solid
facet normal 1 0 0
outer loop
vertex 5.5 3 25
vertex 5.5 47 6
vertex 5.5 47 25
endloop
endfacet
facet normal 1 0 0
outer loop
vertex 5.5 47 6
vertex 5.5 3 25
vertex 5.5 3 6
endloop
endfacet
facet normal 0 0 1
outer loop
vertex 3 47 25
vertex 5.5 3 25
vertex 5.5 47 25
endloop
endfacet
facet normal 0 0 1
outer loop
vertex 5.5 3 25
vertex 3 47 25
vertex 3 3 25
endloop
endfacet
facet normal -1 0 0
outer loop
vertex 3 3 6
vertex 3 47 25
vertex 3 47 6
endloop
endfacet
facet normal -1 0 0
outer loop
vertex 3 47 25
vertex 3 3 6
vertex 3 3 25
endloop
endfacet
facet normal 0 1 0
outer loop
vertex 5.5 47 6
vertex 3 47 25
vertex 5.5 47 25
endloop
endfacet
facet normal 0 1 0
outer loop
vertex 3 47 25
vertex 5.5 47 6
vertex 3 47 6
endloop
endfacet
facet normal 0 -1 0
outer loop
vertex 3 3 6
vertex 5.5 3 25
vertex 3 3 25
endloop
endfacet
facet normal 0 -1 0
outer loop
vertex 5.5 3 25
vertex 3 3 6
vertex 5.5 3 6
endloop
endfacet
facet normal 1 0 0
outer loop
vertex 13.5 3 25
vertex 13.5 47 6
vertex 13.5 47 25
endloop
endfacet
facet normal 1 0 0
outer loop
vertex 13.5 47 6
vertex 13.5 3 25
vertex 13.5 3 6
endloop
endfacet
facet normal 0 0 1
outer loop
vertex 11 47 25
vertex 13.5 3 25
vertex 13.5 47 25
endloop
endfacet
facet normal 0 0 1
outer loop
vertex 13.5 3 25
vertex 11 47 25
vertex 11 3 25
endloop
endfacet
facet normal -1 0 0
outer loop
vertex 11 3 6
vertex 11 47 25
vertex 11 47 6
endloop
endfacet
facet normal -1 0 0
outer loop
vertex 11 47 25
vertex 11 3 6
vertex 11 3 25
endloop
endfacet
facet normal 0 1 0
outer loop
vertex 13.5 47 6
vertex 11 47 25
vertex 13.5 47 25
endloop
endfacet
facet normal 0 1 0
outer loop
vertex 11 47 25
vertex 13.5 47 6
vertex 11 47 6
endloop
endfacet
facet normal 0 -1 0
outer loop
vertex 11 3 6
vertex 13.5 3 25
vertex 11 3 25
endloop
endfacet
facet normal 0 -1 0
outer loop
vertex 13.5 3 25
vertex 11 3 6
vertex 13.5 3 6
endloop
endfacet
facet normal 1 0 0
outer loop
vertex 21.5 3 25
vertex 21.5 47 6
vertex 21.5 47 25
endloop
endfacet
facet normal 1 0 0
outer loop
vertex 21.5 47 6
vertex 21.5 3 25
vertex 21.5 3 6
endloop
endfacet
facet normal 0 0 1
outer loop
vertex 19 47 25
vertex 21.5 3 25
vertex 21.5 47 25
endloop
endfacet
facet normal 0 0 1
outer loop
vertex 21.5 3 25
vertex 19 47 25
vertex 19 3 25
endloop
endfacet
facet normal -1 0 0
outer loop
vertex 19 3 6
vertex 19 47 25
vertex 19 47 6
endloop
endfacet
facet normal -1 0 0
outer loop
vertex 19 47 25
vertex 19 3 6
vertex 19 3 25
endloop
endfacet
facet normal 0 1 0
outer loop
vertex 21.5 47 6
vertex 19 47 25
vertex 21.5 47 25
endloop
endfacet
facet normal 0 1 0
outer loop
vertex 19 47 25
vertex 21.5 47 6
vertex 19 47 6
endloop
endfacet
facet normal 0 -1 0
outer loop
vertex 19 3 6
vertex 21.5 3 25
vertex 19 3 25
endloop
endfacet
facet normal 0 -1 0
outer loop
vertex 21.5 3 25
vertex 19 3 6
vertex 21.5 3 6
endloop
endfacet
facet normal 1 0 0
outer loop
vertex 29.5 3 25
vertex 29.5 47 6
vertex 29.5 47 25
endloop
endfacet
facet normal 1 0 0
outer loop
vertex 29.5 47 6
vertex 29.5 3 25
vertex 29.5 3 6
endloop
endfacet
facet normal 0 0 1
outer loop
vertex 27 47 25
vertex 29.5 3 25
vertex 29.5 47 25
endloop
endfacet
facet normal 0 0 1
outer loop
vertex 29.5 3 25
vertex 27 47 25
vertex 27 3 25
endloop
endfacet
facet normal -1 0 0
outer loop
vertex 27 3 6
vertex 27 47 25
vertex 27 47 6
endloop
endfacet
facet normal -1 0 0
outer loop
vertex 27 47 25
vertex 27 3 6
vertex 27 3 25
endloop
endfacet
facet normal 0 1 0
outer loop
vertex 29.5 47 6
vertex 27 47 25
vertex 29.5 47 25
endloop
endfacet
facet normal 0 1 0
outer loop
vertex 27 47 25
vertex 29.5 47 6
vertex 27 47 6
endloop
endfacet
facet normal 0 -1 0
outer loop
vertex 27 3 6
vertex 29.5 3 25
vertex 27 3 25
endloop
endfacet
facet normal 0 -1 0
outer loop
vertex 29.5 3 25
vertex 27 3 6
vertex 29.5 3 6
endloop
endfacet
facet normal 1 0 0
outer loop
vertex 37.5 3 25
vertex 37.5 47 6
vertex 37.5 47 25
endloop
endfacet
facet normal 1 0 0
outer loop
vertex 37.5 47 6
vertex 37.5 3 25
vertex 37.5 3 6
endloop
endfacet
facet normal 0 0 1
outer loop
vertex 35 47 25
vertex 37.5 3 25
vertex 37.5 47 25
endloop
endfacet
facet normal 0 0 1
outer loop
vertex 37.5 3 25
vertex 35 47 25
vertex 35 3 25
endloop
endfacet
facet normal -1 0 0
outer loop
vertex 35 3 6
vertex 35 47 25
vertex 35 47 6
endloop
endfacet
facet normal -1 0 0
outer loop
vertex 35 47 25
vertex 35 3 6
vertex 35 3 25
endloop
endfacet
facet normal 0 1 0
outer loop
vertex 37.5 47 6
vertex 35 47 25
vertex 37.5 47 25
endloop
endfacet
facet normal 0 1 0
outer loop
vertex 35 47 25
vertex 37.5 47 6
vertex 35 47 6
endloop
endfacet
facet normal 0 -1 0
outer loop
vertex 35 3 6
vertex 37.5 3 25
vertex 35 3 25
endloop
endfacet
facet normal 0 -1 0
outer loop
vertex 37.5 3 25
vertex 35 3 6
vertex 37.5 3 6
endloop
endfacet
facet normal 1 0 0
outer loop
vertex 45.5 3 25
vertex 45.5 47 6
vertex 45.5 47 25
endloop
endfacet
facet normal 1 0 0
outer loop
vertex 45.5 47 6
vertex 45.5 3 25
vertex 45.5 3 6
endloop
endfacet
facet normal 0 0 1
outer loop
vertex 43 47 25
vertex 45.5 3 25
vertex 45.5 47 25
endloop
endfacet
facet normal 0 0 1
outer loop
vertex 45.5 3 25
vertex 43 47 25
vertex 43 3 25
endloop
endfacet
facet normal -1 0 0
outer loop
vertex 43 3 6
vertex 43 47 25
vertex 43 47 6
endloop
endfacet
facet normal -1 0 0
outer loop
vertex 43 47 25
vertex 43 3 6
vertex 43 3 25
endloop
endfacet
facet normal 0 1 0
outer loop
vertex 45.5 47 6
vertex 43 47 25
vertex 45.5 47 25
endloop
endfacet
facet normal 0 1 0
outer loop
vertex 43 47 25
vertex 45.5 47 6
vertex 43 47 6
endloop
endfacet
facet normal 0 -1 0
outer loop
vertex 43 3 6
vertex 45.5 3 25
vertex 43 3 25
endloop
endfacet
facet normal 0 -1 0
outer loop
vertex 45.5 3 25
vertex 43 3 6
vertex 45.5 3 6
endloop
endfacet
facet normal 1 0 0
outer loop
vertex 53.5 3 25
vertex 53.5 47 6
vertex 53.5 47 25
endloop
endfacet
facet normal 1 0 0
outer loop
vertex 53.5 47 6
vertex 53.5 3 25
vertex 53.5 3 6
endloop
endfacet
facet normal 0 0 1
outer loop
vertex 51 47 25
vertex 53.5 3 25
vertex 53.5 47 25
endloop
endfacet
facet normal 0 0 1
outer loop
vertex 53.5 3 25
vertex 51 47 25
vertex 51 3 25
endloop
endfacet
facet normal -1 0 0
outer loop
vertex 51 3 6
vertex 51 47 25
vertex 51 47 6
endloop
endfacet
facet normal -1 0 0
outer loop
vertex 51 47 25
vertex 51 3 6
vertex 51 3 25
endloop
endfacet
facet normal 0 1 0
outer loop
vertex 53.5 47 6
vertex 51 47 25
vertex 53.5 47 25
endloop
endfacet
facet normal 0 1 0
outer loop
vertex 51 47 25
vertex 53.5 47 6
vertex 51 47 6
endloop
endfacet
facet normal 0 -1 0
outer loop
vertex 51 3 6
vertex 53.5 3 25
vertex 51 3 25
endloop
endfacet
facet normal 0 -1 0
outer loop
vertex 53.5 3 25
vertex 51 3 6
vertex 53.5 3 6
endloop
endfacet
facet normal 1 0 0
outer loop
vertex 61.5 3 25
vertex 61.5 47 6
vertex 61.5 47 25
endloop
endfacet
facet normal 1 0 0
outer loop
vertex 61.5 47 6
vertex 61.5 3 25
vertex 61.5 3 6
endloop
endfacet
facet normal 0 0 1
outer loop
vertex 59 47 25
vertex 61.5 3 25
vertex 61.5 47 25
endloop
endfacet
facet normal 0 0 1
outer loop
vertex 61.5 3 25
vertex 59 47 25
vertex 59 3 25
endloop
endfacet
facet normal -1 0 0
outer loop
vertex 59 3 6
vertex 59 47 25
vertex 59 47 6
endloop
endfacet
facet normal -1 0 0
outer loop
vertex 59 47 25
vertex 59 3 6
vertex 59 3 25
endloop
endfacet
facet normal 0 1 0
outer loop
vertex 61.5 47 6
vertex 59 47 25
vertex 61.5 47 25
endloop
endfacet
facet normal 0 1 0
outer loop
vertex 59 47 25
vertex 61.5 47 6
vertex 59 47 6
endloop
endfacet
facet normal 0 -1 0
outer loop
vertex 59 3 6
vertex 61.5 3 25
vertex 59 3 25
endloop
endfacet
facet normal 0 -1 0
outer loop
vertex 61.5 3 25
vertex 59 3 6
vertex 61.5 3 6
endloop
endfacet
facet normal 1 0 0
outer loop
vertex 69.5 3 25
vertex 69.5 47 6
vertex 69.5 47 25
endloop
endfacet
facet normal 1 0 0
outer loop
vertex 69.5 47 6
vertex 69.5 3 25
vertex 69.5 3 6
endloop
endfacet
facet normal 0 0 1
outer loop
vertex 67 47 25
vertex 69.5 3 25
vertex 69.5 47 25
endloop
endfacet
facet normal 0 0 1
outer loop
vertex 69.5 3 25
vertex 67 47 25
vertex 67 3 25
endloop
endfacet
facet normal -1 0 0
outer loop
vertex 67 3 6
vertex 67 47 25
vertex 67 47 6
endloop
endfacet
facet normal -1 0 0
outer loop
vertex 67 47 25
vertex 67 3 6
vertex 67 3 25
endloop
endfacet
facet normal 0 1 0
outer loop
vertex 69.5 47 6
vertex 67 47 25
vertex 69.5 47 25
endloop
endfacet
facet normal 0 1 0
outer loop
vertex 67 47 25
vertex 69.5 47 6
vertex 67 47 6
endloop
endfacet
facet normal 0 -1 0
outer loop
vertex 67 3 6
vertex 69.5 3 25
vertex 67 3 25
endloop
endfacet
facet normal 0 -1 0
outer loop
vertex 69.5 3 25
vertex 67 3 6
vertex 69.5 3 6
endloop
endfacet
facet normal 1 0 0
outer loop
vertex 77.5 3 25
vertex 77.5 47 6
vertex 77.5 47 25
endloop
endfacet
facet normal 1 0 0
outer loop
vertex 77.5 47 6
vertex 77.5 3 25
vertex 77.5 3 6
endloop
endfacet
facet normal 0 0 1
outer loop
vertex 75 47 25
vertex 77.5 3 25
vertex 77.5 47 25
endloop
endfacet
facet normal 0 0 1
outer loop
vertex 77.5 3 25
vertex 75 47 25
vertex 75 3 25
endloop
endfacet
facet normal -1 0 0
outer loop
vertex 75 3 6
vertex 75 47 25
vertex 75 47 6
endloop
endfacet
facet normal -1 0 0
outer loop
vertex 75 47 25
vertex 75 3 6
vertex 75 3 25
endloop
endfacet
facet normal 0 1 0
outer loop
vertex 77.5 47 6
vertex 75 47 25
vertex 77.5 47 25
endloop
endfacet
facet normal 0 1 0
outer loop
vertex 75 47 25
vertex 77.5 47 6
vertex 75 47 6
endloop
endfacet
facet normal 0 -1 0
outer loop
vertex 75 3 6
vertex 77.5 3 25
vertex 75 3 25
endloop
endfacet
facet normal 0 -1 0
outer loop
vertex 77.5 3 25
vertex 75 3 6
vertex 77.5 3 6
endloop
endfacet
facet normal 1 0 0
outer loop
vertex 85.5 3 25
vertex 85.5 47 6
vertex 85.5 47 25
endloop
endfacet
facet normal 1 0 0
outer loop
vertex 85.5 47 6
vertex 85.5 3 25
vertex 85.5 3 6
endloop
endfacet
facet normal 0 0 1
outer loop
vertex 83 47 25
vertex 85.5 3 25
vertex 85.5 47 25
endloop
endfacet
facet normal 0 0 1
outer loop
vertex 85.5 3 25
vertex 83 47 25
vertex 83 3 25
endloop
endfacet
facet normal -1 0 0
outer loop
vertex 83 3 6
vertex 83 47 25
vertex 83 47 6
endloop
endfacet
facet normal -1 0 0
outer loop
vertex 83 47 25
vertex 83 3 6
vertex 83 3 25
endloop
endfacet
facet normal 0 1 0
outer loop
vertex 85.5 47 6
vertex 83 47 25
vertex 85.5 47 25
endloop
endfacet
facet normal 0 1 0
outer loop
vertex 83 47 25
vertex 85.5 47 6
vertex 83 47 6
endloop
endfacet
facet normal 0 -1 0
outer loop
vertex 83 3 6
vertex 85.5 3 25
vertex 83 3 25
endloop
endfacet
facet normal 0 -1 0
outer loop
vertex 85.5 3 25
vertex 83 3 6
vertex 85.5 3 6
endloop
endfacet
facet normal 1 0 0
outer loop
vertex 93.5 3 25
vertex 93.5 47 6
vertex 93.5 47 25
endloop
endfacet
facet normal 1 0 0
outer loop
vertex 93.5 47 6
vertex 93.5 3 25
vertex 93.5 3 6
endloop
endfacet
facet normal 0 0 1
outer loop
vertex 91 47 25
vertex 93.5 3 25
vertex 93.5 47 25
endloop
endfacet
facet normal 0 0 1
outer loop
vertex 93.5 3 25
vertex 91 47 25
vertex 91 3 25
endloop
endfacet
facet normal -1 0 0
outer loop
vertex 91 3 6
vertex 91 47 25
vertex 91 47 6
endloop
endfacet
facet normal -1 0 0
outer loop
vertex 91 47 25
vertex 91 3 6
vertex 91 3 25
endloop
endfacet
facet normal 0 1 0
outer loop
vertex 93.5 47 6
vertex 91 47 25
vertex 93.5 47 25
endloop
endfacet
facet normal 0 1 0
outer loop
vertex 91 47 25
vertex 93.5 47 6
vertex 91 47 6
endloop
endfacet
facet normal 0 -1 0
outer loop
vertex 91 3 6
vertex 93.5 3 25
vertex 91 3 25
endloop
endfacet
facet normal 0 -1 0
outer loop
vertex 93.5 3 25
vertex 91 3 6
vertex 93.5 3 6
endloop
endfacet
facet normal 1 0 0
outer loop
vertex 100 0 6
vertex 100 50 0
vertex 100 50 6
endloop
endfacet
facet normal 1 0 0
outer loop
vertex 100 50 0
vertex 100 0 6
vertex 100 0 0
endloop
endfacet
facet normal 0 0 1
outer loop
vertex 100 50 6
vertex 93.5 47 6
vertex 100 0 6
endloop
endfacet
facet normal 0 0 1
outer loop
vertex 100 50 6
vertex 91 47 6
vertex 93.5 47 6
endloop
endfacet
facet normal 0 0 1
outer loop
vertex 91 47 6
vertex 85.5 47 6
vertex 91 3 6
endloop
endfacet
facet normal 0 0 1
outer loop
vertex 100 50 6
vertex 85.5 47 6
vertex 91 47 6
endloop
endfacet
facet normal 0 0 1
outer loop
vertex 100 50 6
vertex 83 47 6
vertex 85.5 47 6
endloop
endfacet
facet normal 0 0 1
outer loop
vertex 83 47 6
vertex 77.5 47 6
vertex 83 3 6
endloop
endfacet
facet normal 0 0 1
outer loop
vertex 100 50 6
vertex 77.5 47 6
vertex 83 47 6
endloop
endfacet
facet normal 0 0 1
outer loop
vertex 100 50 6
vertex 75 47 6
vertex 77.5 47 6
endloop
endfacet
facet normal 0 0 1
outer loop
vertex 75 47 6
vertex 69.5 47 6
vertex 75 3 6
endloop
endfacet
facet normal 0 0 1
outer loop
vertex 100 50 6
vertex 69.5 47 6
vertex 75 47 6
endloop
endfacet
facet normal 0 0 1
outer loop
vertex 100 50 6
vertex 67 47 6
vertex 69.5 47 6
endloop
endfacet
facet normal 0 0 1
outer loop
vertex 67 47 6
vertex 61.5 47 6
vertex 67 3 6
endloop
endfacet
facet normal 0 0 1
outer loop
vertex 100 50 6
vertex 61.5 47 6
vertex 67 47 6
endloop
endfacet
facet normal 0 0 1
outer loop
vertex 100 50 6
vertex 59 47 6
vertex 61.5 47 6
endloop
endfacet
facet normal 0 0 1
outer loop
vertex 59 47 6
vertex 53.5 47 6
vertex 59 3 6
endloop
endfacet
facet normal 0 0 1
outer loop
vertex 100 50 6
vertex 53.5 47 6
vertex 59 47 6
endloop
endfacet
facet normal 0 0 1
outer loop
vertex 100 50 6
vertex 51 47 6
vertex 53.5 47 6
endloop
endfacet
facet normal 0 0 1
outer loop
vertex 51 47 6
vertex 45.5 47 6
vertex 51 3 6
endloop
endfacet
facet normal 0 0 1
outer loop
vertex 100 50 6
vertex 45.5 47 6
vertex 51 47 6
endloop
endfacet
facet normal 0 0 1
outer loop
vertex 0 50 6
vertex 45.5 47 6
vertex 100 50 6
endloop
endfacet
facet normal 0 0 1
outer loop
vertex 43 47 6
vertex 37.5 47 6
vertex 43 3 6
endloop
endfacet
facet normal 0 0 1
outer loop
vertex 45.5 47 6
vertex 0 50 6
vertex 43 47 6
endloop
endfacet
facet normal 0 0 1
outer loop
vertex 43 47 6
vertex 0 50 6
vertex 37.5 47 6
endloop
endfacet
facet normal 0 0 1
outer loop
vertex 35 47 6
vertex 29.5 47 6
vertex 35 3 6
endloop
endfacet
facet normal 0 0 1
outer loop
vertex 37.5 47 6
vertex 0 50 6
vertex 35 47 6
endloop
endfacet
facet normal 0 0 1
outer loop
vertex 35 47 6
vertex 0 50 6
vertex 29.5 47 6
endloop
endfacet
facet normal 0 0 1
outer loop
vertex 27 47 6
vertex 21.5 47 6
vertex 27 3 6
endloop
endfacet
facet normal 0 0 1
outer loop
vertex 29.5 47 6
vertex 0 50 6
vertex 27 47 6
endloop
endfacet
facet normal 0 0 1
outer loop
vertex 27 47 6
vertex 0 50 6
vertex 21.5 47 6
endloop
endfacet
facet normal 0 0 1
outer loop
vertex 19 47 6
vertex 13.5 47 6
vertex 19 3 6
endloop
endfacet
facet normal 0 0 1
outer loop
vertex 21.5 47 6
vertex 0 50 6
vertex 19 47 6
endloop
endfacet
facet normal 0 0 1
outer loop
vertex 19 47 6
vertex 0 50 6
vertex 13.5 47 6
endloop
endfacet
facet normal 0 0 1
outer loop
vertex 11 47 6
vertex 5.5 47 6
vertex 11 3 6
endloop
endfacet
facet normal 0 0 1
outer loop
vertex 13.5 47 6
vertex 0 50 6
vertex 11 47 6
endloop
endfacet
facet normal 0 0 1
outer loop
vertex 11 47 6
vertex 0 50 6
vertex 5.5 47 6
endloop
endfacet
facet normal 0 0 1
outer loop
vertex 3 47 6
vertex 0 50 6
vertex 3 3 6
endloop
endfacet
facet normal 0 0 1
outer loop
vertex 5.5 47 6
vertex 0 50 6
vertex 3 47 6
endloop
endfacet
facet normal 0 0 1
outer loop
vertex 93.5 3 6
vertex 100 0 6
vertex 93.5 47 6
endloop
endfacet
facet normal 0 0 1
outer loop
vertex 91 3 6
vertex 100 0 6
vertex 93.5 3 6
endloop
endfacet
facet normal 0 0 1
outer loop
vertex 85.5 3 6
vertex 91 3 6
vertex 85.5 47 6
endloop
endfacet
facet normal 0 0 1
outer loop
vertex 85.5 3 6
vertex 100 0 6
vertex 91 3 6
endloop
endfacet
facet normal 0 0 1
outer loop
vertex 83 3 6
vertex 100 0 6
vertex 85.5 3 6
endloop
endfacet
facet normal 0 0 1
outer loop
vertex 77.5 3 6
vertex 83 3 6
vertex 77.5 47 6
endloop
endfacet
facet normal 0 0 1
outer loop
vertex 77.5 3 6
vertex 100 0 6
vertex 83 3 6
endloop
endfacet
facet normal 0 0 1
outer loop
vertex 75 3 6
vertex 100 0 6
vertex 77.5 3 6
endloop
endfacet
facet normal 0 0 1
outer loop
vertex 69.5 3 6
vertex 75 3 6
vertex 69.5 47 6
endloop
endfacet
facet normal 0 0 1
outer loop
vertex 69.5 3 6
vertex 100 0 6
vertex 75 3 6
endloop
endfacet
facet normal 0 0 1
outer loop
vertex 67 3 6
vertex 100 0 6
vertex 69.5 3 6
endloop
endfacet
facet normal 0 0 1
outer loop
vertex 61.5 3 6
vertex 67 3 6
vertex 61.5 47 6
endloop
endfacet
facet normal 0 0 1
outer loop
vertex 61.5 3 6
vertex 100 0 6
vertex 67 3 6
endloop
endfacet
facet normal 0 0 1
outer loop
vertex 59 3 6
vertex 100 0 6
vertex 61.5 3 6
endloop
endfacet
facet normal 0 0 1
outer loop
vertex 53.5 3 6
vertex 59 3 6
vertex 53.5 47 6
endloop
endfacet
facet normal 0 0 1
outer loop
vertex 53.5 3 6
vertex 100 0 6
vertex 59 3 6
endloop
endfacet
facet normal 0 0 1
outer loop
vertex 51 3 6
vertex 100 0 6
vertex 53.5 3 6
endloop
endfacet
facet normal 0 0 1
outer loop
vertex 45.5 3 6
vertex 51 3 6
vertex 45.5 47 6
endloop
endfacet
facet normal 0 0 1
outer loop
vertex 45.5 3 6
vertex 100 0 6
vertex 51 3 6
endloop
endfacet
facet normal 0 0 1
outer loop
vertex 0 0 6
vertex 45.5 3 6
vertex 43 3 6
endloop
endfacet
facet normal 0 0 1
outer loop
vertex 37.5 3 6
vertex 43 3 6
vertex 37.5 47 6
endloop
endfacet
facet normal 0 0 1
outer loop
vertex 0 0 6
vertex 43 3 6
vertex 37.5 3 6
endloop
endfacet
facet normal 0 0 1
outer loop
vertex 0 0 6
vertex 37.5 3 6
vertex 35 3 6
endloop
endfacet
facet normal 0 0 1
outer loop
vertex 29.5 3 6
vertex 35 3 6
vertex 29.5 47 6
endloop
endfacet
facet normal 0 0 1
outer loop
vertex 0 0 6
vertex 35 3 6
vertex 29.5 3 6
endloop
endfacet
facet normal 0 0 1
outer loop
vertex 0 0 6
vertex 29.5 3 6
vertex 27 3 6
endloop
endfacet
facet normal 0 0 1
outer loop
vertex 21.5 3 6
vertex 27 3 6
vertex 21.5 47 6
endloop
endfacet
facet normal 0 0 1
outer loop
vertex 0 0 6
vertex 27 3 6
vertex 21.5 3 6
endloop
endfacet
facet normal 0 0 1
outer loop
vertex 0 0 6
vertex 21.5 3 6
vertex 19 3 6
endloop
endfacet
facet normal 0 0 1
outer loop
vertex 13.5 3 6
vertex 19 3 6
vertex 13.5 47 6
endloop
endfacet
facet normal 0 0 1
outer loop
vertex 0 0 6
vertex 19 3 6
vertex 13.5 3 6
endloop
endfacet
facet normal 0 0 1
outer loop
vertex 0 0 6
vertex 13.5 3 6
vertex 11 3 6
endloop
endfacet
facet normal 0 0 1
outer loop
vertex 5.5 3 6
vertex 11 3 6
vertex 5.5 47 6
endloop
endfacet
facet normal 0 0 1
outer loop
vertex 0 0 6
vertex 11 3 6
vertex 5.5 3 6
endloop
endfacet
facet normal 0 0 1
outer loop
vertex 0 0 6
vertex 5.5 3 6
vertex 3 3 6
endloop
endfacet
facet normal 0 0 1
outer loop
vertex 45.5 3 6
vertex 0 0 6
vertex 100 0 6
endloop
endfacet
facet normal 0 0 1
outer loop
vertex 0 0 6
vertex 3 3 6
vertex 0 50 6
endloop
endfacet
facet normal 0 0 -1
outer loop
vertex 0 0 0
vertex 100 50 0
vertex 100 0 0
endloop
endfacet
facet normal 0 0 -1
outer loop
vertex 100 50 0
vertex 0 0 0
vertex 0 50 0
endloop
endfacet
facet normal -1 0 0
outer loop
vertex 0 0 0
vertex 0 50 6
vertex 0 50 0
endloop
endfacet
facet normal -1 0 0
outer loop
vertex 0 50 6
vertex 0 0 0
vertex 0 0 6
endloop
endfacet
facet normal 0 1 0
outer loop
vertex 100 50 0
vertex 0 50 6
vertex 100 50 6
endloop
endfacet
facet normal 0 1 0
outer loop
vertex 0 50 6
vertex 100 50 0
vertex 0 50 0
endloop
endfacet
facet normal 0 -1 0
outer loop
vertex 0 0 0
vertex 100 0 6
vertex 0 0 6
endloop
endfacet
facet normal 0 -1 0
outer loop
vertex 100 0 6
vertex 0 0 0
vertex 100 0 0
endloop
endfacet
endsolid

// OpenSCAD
$fn = 32;

// ----------------------------------------------------------------------
// Heatsink: uniform fin block
// ----------------------------------------------------------------------

// --- parameters (mm) ---
base_l = 100;             // base length, X
base_w = 50;              // base width, Y
base_t = 6;               // base plate thickness
fin_h = 20;               // fin height above the base
fin_t = 2.5;              // fin thickness
edge = 3;                 // margin from the base ends
pitch = 8;                // fin pitch

n_fins = floor((base_l - 2 * edge - fin_t) / pitch) + 1;  // fin count
total_h = base_t + fin_h - 1;  // overall height

union() {
  cube([base_l, base_w, base_t]);
  for (i = [0 : n_fins - 1])
    translate([edge + i * pitch, edge, base_t - 1])
      cube([fin_t, base_w - 2 * edge, fin_h]);
}
